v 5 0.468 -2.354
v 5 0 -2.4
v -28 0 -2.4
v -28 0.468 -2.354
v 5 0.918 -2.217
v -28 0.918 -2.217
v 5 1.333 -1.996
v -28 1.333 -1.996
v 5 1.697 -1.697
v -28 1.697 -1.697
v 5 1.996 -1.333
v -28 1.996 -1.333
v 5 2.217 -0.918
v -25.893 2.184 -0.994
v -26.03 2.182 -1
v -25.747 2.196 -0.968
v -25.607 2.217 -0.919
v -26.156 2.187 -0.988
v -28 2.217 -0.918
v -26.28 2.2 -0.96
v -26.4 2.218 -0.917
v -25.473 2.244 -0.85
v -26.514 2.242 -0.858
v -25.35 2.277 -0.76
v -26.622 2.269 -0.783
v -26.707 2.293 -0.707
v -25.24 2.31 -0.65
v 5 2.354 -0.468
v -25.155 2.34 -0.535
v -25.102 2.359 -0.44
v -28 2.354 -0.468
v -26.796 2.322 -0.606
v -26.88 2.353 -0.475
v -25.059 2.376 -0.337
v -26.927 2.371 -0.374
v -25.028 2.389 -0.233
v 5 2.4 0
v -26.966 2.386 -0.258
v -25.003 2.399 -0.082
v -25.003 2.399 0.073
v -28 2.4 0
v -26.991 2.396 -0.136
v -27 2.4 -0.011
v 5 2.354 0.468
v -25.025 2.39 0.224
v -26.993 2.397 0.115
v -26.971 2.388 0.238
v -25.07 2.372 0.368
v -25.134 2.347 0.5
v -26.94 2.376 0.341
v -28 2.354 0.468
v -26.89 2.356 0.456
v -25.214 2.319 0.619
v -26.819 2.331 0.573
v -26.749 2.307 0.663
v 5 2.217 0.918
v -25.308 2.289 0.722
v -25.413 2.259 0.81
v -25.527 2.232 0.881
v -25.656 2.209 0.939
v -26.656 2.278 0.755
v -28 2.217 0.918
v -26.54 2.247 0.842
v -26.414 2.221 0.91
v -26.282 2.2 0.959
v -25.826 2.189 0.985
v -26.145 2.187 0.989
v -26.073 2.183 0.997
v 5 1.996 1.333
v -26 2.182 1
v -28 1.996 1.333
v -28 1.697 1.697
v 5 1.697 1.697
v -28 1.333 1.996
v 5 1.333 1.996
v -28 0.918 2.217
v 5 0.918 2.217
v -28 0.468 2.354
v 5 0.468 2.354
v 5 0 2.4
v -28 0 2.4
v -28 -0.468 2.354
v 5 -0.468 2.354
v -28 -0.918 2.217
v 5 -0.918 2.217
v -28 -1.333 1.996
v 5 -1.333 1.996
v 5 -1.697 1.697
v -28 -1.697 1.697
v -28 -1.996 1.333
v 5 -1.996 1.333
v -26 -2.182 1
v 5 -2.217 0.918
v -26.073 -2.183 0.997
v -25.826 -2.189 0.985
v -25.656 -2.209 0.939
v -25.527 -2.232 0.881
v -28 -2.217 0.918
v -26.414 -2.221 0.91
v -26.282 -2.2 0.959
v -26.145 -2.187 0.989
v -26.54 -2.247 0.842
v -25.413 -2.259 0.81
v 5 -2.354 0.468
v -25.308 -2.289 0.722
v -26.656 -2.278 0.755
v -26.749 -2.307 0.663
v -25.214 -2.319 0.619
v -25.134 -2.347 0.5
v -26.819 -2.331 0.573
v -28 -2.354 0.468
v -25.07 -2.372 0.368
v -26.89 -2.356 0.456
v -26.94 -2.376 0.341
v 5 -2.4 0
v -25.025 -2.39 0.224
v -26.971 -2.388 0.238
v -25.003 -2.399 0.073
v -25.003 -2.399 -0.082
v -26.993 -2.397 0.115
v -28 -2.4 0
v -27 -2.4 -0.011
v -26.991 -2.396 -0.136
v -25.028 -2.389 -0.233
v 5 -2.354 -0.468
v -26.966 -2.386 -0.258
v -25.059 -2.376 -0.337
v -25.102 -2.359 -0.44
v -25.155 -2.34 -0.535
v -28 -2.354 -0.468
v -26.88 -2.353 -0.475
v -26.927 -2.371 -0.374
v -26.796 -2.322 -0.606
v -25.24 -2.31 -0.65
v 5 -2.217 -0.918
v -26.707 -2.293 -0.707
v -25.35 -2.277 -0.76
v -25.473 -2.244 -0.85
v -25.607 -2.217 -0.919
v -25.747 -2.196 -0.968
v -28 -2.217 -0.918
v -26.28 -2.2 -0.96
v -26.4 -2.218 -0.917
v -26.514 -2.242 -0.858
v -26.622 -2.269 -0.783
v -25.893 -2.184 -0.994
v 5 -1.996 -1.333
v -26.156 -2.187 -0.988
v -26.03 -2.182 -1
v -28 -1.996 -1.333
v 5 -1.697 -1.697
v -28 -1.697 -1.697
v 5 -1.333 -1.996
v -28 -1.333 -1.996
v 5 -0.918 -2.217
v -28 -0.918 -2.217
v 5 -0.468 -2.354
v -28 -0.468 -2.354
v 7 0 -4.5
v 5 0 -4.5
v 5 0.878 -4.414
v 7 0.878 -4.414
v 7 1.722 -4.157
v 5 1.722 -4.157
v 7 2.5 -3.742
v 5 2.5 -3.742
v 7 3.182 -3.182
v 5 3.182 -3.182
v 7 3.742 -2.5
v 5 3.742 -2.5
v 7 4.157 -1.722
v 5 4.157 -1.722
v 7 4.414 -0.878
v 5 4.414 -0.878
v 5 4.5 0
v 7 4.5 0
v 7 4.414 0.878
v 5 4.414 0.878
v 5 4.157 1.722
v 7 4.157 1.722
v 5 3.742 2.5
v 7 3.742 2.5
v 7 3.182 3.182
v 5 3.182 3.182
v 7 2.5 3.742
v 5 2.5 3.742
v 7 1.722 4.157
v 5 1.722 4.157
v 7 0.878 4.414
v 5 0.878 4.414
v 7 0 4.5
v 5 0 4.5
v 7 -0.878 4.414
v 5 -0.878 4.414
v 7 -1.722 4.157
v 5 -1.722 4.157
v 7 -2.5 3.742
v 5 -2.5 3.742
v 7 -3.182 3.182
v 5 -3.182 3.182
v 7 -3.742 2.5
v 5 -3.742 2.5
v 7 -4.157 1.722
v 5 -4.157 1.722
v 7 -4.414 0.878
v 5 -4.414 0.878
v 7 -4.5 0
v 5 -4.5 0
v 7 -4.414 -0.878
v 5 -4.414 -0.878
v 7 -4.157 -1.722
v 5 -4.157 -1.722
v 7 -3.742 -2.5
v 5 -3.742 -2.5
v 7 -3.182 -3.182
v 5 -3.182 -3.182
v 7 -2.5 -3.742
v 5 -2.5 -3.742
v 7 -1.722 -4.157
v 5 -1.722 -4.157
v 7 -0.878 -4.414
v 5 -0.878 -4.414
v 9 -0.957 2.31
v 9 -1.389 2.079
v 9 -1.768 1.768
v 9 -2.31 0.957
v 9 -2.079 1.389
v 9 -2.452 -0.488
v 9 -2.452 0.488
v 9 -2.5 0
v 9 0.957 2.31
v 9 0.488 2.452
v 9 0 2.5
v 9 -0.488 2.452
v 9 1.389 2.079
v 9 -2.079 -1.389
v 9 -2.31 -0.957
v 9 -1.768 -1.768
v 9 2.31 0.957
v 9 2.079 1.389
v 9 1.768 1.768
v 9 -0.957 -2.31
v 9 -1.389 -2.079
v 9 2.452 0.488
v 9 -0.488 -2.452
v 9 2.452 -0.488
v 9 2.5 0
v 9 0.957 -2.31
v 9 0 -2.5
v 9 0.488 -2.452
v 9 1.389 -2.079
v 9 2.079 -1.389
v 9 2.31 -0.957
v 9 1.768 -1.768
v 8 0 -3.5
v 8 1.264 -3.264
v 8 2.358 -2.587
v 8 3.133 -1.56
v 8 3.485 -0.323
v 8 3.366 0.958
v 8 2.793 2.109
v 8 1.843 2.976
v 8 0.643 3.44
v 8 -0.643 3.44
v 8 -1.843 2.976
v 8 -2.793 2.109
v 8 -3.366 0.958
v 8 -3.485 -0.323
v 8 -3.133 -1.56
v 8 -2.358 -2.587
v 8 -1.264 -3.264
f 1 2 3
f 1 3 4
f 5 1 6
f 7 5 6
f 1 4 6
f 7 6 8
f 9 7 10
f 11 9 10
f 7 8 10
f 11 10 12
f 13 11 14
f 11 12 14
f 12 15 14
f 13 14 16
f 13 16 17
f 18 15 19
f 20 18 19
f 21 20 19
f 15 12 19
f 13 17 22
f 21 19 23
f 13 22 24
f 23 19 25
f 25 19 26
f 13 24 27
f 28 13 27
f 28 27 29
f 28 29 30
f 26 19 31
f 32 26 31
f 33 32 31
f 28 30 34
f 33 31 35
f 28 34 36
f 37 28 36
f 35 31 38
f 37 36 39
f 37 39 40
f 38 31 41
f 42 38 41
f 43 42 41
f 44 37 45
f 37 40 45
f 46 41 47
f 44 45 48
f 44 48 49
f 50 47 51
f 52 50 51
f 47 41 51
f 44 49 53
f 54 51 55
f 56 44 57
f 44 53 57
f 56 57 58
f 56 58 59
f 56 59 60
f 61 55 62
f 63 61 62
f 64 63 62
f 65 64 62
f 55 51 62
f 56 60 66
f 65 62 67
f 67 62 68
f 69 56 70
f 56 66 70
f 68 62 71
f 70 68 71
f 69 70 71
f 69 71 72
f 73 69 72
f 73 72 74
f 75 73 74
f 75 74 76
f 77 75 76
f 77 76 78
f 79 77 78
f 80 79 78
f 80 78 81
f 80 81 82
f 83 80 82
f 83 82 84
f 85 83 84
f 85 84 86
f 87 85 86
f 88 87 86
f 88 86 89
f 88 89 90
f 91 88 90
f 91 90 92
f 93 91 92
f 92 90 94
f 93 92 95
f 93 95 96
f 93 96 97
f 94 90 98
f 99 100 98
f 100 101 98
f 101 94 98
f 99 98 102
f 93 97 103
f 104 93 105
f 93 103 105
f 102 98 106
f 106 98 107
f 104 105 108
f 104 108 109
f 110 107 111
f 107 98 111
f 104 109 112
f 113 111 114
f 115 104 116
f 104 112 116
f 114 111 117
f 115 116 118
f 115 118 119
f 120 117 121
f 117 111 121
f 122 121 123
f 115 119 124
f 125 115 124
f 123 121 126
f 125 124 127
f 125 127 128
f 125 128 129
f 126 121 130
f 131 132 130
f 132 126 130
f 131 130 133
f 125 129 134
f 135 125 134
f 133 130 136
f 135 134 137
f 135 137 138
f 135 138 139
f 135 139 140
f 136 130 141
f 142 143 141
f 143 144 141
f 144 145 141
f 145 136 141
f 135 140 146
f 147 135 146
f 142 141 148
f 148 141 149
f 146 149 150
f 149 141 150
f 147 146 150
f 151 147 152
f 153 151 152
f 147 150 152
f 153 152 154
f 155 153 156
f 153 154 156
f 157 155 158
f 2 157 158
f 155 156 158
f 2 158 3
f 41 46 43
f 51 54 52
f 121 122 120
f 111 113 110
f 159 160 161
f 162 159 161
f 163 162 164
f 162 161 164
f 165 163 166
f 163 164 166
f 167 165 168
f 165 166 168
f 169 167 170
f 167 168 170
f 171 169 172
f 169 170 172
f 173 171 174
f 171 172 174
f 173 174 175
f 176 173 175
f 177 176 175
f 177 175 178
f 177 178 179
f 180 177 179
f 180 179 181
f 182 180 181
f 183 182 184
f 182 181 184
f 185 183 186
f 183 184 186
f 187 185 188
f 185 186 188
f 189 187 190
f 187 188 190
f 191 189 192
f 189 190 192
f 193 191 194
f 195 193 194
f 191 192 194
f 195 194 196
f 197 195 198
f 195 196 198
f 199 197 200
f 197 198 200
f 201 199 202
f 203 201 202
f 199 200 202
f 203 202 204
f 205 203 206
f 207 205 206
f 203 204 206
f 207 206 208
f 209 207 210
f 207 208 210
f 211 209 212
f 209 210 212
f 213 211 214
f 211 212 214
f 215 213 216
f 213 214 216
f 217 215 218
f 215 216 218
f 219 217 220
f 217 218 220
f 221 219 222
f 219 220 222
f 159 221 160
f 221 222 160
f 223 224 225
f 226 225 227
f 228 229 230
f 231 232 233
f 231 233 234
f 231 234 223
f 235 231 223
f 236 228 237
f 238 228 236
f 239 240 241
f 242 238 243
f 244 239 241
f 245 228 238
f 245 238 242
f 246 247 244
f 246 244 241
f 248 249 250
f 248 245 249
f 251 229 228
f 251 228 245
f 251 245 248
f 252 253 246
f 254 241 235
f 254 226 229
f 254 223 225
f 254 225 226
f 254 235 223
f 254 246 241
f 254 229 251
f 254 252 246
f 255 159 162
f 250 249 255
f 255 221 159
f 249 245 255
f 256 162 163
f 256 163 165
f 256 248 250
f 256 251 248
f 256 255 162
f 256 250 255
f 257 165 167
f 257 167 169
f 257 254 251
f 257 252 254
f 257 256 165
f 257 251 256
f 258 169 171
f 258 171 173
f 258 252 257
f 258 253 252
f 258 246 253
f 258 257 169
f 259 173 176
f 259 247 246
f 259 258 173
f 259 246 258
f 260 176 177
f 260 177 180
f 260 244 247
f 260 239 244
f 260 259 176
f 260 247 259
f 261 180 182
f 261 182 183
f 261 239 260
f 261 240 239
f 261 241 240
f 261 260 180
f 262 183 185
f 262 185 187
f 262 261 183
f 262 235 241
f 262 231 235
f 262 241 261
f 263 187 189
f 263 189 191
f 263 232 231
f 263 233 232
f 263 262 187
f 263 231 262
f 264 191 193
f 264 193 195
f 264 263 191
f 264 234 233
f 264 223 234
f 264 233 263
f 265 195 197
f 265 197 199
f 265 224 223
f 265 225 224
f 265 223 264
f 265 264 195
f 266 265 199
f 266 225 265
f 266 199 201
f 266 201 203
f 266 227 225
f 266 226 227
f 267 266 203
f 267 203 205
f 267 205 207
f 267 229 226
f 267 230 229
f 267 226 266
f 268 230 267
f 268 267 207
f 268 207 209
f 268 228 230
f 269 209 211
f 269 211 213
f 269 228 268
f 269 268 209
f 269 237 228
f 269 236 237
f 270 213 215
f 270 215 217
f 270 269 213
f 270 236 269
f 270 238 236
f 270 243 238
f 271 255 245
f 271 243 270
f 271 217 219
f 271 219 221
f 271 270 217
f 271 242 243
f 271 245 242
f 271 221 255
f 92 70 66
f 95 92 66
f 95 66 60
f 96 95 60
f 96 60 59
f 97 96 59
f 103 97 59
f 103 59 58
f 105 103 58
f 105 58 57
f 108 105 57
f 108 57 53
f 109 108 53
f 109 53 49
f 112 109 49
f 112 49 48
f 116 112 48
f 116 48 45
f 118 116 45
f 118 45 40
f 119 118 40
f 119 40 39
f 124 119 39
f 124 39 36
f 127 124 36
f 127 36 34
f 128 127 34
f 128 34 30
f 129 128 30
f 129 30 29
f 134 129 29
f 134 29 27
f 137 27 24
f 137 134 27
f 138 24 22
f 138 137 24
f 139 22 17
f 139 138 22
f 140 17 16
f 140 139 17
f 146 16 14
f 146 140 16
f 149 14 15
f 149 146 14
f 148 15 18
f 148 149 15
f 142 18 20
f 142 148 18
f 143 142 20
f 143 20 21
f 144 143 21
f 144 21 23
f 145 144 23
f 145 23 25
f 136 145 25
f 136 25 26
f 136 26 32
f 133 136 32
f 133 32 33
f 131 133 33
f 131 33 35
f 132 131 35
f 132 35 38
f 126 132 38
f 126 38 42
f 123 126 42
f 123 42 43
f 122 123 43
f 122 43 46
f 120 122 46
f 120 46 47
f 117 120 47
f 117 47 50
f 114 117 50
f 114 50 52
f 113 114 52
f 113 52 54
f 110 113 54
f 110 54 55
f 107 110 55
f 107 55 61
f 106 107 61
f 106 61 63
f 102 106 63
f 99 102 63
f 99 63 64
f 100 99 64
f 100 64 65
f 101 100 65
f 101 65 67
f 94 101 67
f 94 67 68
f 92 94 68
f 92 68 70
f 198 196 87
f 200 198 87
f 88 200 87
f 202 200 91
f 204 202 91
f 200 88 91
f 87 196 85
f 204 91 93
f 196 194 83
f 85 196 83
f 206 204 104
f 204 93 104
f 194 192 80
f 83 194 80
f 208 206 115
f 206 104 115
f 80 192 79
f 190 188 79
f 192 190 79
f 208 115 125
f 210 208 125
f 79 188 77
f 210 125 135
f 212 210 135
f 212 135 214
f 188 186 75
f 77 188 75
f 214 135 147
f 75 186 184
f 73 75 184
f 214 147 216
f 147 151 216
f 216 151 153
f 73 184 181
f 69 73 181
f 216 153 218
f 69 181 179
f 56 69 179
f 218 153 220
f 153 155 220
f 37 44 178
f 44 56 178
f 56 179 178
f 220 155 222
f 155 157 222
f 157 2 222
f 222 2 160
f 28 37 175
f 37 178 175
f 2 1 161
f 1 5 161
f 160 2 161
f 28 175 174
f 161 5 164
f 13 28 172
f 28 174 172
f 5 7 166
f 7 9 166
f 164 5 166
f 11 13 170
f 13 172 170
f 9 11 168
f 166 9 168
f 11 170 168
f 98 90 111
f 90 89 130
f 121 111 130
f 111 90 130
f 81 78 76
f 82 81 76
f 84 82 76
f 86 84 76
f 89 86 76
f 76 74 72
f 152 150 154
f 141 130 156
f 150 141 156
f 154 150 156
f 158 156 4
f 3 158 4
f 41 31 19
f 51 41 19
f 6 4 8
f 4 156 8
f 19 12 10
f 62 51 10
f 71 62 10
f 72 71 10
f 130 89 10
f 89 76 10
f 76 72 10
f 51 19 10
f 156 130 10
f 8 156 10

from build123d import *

# Parameters (mm, degrees)
DODANIE_WYCI_GNI_CIE1_DEPTH      = 5
DODANIE_WYCI_GNI_CIE1_DEPTH_BACK = 28
SZKIC1_R                         = 2.4
SZKIC2_R                         = 4.5
DODANIE_WYCI_GNI_CIE2_DEPTH      = 4
SFAZOWANIE1_SIZE                 = 2
WYTNIJ_WYCI_GNI_CIE1_DEPTH       = 29.714108031
WYTNIJ_WYCI_GNI_CIE1_DEPTH_BACK  = 29.714108031
SZKIC3_R                         = 1


with BuildPart() as part:
    # Szkic1 → Dodanie-wyciągnięcie1 (new, two sides: drawn at the far end of the back side and taken through both)
    with BuildSketch(Plane(origin=(0, 0, 0), x_dir=(0, 0, -1), z_dir=(1, 0, 0)).offset(-DODANIE_WYCI_GNI_CIE1_DEPTH_BACK)):
        Circle(SZKIC1_R)
    extrude(amount=DODANIE_WYCI_GNI_CIE1_DEPTH + DODANIE_WYCI_GNI_CIE1_DEPTH_BACK)

    # Szkic2 → Dodanie-wyciągnięcie2 (add)
    with BuildSketch(Plane(origin=(5, 0, 0), x_dir=(0, 0, -1), z_dir=(1, 0, 0))):
        Circle(SZKIC2_R)
    extrude(amount=DODANIE_WYCI_GNI_CIE2_DEPTH)

    # Sfazowanie1
    sfazowanie1_edges = [part.edges().sort_by_distance(p)[0] for p in [
        (9, 0, 4.5),
    ]]
    chamfer(sfazowanie1_edges, length=SFAZOWANIE1_SIZE)

    # Szkic3 → Wytnij-wyciągnięcie1 (cut, two sides: drawn at the far end of the back side and taken through both)
    with BuildSketch(Plane(origin=(0, 0, 0), x_dir=(1, 0, 0), z_dir=(0, 1, 0)).offset(-WYTNIJ_WYCI_GNI_CIE1_DEPTH_BACK)):
        with Locations(Location((-26, 0, 0), (0, 0, 270))):
            Circle(SZKIC3_R)
    extrude(amount=WYTNIJ_WYCI_GNI_CIE1_DEPTH + WYTNIJ_WYCI_GNI_CIE1_DEPTH_BACK, mode=Mode.SUBTRACT)


solid = part.part
